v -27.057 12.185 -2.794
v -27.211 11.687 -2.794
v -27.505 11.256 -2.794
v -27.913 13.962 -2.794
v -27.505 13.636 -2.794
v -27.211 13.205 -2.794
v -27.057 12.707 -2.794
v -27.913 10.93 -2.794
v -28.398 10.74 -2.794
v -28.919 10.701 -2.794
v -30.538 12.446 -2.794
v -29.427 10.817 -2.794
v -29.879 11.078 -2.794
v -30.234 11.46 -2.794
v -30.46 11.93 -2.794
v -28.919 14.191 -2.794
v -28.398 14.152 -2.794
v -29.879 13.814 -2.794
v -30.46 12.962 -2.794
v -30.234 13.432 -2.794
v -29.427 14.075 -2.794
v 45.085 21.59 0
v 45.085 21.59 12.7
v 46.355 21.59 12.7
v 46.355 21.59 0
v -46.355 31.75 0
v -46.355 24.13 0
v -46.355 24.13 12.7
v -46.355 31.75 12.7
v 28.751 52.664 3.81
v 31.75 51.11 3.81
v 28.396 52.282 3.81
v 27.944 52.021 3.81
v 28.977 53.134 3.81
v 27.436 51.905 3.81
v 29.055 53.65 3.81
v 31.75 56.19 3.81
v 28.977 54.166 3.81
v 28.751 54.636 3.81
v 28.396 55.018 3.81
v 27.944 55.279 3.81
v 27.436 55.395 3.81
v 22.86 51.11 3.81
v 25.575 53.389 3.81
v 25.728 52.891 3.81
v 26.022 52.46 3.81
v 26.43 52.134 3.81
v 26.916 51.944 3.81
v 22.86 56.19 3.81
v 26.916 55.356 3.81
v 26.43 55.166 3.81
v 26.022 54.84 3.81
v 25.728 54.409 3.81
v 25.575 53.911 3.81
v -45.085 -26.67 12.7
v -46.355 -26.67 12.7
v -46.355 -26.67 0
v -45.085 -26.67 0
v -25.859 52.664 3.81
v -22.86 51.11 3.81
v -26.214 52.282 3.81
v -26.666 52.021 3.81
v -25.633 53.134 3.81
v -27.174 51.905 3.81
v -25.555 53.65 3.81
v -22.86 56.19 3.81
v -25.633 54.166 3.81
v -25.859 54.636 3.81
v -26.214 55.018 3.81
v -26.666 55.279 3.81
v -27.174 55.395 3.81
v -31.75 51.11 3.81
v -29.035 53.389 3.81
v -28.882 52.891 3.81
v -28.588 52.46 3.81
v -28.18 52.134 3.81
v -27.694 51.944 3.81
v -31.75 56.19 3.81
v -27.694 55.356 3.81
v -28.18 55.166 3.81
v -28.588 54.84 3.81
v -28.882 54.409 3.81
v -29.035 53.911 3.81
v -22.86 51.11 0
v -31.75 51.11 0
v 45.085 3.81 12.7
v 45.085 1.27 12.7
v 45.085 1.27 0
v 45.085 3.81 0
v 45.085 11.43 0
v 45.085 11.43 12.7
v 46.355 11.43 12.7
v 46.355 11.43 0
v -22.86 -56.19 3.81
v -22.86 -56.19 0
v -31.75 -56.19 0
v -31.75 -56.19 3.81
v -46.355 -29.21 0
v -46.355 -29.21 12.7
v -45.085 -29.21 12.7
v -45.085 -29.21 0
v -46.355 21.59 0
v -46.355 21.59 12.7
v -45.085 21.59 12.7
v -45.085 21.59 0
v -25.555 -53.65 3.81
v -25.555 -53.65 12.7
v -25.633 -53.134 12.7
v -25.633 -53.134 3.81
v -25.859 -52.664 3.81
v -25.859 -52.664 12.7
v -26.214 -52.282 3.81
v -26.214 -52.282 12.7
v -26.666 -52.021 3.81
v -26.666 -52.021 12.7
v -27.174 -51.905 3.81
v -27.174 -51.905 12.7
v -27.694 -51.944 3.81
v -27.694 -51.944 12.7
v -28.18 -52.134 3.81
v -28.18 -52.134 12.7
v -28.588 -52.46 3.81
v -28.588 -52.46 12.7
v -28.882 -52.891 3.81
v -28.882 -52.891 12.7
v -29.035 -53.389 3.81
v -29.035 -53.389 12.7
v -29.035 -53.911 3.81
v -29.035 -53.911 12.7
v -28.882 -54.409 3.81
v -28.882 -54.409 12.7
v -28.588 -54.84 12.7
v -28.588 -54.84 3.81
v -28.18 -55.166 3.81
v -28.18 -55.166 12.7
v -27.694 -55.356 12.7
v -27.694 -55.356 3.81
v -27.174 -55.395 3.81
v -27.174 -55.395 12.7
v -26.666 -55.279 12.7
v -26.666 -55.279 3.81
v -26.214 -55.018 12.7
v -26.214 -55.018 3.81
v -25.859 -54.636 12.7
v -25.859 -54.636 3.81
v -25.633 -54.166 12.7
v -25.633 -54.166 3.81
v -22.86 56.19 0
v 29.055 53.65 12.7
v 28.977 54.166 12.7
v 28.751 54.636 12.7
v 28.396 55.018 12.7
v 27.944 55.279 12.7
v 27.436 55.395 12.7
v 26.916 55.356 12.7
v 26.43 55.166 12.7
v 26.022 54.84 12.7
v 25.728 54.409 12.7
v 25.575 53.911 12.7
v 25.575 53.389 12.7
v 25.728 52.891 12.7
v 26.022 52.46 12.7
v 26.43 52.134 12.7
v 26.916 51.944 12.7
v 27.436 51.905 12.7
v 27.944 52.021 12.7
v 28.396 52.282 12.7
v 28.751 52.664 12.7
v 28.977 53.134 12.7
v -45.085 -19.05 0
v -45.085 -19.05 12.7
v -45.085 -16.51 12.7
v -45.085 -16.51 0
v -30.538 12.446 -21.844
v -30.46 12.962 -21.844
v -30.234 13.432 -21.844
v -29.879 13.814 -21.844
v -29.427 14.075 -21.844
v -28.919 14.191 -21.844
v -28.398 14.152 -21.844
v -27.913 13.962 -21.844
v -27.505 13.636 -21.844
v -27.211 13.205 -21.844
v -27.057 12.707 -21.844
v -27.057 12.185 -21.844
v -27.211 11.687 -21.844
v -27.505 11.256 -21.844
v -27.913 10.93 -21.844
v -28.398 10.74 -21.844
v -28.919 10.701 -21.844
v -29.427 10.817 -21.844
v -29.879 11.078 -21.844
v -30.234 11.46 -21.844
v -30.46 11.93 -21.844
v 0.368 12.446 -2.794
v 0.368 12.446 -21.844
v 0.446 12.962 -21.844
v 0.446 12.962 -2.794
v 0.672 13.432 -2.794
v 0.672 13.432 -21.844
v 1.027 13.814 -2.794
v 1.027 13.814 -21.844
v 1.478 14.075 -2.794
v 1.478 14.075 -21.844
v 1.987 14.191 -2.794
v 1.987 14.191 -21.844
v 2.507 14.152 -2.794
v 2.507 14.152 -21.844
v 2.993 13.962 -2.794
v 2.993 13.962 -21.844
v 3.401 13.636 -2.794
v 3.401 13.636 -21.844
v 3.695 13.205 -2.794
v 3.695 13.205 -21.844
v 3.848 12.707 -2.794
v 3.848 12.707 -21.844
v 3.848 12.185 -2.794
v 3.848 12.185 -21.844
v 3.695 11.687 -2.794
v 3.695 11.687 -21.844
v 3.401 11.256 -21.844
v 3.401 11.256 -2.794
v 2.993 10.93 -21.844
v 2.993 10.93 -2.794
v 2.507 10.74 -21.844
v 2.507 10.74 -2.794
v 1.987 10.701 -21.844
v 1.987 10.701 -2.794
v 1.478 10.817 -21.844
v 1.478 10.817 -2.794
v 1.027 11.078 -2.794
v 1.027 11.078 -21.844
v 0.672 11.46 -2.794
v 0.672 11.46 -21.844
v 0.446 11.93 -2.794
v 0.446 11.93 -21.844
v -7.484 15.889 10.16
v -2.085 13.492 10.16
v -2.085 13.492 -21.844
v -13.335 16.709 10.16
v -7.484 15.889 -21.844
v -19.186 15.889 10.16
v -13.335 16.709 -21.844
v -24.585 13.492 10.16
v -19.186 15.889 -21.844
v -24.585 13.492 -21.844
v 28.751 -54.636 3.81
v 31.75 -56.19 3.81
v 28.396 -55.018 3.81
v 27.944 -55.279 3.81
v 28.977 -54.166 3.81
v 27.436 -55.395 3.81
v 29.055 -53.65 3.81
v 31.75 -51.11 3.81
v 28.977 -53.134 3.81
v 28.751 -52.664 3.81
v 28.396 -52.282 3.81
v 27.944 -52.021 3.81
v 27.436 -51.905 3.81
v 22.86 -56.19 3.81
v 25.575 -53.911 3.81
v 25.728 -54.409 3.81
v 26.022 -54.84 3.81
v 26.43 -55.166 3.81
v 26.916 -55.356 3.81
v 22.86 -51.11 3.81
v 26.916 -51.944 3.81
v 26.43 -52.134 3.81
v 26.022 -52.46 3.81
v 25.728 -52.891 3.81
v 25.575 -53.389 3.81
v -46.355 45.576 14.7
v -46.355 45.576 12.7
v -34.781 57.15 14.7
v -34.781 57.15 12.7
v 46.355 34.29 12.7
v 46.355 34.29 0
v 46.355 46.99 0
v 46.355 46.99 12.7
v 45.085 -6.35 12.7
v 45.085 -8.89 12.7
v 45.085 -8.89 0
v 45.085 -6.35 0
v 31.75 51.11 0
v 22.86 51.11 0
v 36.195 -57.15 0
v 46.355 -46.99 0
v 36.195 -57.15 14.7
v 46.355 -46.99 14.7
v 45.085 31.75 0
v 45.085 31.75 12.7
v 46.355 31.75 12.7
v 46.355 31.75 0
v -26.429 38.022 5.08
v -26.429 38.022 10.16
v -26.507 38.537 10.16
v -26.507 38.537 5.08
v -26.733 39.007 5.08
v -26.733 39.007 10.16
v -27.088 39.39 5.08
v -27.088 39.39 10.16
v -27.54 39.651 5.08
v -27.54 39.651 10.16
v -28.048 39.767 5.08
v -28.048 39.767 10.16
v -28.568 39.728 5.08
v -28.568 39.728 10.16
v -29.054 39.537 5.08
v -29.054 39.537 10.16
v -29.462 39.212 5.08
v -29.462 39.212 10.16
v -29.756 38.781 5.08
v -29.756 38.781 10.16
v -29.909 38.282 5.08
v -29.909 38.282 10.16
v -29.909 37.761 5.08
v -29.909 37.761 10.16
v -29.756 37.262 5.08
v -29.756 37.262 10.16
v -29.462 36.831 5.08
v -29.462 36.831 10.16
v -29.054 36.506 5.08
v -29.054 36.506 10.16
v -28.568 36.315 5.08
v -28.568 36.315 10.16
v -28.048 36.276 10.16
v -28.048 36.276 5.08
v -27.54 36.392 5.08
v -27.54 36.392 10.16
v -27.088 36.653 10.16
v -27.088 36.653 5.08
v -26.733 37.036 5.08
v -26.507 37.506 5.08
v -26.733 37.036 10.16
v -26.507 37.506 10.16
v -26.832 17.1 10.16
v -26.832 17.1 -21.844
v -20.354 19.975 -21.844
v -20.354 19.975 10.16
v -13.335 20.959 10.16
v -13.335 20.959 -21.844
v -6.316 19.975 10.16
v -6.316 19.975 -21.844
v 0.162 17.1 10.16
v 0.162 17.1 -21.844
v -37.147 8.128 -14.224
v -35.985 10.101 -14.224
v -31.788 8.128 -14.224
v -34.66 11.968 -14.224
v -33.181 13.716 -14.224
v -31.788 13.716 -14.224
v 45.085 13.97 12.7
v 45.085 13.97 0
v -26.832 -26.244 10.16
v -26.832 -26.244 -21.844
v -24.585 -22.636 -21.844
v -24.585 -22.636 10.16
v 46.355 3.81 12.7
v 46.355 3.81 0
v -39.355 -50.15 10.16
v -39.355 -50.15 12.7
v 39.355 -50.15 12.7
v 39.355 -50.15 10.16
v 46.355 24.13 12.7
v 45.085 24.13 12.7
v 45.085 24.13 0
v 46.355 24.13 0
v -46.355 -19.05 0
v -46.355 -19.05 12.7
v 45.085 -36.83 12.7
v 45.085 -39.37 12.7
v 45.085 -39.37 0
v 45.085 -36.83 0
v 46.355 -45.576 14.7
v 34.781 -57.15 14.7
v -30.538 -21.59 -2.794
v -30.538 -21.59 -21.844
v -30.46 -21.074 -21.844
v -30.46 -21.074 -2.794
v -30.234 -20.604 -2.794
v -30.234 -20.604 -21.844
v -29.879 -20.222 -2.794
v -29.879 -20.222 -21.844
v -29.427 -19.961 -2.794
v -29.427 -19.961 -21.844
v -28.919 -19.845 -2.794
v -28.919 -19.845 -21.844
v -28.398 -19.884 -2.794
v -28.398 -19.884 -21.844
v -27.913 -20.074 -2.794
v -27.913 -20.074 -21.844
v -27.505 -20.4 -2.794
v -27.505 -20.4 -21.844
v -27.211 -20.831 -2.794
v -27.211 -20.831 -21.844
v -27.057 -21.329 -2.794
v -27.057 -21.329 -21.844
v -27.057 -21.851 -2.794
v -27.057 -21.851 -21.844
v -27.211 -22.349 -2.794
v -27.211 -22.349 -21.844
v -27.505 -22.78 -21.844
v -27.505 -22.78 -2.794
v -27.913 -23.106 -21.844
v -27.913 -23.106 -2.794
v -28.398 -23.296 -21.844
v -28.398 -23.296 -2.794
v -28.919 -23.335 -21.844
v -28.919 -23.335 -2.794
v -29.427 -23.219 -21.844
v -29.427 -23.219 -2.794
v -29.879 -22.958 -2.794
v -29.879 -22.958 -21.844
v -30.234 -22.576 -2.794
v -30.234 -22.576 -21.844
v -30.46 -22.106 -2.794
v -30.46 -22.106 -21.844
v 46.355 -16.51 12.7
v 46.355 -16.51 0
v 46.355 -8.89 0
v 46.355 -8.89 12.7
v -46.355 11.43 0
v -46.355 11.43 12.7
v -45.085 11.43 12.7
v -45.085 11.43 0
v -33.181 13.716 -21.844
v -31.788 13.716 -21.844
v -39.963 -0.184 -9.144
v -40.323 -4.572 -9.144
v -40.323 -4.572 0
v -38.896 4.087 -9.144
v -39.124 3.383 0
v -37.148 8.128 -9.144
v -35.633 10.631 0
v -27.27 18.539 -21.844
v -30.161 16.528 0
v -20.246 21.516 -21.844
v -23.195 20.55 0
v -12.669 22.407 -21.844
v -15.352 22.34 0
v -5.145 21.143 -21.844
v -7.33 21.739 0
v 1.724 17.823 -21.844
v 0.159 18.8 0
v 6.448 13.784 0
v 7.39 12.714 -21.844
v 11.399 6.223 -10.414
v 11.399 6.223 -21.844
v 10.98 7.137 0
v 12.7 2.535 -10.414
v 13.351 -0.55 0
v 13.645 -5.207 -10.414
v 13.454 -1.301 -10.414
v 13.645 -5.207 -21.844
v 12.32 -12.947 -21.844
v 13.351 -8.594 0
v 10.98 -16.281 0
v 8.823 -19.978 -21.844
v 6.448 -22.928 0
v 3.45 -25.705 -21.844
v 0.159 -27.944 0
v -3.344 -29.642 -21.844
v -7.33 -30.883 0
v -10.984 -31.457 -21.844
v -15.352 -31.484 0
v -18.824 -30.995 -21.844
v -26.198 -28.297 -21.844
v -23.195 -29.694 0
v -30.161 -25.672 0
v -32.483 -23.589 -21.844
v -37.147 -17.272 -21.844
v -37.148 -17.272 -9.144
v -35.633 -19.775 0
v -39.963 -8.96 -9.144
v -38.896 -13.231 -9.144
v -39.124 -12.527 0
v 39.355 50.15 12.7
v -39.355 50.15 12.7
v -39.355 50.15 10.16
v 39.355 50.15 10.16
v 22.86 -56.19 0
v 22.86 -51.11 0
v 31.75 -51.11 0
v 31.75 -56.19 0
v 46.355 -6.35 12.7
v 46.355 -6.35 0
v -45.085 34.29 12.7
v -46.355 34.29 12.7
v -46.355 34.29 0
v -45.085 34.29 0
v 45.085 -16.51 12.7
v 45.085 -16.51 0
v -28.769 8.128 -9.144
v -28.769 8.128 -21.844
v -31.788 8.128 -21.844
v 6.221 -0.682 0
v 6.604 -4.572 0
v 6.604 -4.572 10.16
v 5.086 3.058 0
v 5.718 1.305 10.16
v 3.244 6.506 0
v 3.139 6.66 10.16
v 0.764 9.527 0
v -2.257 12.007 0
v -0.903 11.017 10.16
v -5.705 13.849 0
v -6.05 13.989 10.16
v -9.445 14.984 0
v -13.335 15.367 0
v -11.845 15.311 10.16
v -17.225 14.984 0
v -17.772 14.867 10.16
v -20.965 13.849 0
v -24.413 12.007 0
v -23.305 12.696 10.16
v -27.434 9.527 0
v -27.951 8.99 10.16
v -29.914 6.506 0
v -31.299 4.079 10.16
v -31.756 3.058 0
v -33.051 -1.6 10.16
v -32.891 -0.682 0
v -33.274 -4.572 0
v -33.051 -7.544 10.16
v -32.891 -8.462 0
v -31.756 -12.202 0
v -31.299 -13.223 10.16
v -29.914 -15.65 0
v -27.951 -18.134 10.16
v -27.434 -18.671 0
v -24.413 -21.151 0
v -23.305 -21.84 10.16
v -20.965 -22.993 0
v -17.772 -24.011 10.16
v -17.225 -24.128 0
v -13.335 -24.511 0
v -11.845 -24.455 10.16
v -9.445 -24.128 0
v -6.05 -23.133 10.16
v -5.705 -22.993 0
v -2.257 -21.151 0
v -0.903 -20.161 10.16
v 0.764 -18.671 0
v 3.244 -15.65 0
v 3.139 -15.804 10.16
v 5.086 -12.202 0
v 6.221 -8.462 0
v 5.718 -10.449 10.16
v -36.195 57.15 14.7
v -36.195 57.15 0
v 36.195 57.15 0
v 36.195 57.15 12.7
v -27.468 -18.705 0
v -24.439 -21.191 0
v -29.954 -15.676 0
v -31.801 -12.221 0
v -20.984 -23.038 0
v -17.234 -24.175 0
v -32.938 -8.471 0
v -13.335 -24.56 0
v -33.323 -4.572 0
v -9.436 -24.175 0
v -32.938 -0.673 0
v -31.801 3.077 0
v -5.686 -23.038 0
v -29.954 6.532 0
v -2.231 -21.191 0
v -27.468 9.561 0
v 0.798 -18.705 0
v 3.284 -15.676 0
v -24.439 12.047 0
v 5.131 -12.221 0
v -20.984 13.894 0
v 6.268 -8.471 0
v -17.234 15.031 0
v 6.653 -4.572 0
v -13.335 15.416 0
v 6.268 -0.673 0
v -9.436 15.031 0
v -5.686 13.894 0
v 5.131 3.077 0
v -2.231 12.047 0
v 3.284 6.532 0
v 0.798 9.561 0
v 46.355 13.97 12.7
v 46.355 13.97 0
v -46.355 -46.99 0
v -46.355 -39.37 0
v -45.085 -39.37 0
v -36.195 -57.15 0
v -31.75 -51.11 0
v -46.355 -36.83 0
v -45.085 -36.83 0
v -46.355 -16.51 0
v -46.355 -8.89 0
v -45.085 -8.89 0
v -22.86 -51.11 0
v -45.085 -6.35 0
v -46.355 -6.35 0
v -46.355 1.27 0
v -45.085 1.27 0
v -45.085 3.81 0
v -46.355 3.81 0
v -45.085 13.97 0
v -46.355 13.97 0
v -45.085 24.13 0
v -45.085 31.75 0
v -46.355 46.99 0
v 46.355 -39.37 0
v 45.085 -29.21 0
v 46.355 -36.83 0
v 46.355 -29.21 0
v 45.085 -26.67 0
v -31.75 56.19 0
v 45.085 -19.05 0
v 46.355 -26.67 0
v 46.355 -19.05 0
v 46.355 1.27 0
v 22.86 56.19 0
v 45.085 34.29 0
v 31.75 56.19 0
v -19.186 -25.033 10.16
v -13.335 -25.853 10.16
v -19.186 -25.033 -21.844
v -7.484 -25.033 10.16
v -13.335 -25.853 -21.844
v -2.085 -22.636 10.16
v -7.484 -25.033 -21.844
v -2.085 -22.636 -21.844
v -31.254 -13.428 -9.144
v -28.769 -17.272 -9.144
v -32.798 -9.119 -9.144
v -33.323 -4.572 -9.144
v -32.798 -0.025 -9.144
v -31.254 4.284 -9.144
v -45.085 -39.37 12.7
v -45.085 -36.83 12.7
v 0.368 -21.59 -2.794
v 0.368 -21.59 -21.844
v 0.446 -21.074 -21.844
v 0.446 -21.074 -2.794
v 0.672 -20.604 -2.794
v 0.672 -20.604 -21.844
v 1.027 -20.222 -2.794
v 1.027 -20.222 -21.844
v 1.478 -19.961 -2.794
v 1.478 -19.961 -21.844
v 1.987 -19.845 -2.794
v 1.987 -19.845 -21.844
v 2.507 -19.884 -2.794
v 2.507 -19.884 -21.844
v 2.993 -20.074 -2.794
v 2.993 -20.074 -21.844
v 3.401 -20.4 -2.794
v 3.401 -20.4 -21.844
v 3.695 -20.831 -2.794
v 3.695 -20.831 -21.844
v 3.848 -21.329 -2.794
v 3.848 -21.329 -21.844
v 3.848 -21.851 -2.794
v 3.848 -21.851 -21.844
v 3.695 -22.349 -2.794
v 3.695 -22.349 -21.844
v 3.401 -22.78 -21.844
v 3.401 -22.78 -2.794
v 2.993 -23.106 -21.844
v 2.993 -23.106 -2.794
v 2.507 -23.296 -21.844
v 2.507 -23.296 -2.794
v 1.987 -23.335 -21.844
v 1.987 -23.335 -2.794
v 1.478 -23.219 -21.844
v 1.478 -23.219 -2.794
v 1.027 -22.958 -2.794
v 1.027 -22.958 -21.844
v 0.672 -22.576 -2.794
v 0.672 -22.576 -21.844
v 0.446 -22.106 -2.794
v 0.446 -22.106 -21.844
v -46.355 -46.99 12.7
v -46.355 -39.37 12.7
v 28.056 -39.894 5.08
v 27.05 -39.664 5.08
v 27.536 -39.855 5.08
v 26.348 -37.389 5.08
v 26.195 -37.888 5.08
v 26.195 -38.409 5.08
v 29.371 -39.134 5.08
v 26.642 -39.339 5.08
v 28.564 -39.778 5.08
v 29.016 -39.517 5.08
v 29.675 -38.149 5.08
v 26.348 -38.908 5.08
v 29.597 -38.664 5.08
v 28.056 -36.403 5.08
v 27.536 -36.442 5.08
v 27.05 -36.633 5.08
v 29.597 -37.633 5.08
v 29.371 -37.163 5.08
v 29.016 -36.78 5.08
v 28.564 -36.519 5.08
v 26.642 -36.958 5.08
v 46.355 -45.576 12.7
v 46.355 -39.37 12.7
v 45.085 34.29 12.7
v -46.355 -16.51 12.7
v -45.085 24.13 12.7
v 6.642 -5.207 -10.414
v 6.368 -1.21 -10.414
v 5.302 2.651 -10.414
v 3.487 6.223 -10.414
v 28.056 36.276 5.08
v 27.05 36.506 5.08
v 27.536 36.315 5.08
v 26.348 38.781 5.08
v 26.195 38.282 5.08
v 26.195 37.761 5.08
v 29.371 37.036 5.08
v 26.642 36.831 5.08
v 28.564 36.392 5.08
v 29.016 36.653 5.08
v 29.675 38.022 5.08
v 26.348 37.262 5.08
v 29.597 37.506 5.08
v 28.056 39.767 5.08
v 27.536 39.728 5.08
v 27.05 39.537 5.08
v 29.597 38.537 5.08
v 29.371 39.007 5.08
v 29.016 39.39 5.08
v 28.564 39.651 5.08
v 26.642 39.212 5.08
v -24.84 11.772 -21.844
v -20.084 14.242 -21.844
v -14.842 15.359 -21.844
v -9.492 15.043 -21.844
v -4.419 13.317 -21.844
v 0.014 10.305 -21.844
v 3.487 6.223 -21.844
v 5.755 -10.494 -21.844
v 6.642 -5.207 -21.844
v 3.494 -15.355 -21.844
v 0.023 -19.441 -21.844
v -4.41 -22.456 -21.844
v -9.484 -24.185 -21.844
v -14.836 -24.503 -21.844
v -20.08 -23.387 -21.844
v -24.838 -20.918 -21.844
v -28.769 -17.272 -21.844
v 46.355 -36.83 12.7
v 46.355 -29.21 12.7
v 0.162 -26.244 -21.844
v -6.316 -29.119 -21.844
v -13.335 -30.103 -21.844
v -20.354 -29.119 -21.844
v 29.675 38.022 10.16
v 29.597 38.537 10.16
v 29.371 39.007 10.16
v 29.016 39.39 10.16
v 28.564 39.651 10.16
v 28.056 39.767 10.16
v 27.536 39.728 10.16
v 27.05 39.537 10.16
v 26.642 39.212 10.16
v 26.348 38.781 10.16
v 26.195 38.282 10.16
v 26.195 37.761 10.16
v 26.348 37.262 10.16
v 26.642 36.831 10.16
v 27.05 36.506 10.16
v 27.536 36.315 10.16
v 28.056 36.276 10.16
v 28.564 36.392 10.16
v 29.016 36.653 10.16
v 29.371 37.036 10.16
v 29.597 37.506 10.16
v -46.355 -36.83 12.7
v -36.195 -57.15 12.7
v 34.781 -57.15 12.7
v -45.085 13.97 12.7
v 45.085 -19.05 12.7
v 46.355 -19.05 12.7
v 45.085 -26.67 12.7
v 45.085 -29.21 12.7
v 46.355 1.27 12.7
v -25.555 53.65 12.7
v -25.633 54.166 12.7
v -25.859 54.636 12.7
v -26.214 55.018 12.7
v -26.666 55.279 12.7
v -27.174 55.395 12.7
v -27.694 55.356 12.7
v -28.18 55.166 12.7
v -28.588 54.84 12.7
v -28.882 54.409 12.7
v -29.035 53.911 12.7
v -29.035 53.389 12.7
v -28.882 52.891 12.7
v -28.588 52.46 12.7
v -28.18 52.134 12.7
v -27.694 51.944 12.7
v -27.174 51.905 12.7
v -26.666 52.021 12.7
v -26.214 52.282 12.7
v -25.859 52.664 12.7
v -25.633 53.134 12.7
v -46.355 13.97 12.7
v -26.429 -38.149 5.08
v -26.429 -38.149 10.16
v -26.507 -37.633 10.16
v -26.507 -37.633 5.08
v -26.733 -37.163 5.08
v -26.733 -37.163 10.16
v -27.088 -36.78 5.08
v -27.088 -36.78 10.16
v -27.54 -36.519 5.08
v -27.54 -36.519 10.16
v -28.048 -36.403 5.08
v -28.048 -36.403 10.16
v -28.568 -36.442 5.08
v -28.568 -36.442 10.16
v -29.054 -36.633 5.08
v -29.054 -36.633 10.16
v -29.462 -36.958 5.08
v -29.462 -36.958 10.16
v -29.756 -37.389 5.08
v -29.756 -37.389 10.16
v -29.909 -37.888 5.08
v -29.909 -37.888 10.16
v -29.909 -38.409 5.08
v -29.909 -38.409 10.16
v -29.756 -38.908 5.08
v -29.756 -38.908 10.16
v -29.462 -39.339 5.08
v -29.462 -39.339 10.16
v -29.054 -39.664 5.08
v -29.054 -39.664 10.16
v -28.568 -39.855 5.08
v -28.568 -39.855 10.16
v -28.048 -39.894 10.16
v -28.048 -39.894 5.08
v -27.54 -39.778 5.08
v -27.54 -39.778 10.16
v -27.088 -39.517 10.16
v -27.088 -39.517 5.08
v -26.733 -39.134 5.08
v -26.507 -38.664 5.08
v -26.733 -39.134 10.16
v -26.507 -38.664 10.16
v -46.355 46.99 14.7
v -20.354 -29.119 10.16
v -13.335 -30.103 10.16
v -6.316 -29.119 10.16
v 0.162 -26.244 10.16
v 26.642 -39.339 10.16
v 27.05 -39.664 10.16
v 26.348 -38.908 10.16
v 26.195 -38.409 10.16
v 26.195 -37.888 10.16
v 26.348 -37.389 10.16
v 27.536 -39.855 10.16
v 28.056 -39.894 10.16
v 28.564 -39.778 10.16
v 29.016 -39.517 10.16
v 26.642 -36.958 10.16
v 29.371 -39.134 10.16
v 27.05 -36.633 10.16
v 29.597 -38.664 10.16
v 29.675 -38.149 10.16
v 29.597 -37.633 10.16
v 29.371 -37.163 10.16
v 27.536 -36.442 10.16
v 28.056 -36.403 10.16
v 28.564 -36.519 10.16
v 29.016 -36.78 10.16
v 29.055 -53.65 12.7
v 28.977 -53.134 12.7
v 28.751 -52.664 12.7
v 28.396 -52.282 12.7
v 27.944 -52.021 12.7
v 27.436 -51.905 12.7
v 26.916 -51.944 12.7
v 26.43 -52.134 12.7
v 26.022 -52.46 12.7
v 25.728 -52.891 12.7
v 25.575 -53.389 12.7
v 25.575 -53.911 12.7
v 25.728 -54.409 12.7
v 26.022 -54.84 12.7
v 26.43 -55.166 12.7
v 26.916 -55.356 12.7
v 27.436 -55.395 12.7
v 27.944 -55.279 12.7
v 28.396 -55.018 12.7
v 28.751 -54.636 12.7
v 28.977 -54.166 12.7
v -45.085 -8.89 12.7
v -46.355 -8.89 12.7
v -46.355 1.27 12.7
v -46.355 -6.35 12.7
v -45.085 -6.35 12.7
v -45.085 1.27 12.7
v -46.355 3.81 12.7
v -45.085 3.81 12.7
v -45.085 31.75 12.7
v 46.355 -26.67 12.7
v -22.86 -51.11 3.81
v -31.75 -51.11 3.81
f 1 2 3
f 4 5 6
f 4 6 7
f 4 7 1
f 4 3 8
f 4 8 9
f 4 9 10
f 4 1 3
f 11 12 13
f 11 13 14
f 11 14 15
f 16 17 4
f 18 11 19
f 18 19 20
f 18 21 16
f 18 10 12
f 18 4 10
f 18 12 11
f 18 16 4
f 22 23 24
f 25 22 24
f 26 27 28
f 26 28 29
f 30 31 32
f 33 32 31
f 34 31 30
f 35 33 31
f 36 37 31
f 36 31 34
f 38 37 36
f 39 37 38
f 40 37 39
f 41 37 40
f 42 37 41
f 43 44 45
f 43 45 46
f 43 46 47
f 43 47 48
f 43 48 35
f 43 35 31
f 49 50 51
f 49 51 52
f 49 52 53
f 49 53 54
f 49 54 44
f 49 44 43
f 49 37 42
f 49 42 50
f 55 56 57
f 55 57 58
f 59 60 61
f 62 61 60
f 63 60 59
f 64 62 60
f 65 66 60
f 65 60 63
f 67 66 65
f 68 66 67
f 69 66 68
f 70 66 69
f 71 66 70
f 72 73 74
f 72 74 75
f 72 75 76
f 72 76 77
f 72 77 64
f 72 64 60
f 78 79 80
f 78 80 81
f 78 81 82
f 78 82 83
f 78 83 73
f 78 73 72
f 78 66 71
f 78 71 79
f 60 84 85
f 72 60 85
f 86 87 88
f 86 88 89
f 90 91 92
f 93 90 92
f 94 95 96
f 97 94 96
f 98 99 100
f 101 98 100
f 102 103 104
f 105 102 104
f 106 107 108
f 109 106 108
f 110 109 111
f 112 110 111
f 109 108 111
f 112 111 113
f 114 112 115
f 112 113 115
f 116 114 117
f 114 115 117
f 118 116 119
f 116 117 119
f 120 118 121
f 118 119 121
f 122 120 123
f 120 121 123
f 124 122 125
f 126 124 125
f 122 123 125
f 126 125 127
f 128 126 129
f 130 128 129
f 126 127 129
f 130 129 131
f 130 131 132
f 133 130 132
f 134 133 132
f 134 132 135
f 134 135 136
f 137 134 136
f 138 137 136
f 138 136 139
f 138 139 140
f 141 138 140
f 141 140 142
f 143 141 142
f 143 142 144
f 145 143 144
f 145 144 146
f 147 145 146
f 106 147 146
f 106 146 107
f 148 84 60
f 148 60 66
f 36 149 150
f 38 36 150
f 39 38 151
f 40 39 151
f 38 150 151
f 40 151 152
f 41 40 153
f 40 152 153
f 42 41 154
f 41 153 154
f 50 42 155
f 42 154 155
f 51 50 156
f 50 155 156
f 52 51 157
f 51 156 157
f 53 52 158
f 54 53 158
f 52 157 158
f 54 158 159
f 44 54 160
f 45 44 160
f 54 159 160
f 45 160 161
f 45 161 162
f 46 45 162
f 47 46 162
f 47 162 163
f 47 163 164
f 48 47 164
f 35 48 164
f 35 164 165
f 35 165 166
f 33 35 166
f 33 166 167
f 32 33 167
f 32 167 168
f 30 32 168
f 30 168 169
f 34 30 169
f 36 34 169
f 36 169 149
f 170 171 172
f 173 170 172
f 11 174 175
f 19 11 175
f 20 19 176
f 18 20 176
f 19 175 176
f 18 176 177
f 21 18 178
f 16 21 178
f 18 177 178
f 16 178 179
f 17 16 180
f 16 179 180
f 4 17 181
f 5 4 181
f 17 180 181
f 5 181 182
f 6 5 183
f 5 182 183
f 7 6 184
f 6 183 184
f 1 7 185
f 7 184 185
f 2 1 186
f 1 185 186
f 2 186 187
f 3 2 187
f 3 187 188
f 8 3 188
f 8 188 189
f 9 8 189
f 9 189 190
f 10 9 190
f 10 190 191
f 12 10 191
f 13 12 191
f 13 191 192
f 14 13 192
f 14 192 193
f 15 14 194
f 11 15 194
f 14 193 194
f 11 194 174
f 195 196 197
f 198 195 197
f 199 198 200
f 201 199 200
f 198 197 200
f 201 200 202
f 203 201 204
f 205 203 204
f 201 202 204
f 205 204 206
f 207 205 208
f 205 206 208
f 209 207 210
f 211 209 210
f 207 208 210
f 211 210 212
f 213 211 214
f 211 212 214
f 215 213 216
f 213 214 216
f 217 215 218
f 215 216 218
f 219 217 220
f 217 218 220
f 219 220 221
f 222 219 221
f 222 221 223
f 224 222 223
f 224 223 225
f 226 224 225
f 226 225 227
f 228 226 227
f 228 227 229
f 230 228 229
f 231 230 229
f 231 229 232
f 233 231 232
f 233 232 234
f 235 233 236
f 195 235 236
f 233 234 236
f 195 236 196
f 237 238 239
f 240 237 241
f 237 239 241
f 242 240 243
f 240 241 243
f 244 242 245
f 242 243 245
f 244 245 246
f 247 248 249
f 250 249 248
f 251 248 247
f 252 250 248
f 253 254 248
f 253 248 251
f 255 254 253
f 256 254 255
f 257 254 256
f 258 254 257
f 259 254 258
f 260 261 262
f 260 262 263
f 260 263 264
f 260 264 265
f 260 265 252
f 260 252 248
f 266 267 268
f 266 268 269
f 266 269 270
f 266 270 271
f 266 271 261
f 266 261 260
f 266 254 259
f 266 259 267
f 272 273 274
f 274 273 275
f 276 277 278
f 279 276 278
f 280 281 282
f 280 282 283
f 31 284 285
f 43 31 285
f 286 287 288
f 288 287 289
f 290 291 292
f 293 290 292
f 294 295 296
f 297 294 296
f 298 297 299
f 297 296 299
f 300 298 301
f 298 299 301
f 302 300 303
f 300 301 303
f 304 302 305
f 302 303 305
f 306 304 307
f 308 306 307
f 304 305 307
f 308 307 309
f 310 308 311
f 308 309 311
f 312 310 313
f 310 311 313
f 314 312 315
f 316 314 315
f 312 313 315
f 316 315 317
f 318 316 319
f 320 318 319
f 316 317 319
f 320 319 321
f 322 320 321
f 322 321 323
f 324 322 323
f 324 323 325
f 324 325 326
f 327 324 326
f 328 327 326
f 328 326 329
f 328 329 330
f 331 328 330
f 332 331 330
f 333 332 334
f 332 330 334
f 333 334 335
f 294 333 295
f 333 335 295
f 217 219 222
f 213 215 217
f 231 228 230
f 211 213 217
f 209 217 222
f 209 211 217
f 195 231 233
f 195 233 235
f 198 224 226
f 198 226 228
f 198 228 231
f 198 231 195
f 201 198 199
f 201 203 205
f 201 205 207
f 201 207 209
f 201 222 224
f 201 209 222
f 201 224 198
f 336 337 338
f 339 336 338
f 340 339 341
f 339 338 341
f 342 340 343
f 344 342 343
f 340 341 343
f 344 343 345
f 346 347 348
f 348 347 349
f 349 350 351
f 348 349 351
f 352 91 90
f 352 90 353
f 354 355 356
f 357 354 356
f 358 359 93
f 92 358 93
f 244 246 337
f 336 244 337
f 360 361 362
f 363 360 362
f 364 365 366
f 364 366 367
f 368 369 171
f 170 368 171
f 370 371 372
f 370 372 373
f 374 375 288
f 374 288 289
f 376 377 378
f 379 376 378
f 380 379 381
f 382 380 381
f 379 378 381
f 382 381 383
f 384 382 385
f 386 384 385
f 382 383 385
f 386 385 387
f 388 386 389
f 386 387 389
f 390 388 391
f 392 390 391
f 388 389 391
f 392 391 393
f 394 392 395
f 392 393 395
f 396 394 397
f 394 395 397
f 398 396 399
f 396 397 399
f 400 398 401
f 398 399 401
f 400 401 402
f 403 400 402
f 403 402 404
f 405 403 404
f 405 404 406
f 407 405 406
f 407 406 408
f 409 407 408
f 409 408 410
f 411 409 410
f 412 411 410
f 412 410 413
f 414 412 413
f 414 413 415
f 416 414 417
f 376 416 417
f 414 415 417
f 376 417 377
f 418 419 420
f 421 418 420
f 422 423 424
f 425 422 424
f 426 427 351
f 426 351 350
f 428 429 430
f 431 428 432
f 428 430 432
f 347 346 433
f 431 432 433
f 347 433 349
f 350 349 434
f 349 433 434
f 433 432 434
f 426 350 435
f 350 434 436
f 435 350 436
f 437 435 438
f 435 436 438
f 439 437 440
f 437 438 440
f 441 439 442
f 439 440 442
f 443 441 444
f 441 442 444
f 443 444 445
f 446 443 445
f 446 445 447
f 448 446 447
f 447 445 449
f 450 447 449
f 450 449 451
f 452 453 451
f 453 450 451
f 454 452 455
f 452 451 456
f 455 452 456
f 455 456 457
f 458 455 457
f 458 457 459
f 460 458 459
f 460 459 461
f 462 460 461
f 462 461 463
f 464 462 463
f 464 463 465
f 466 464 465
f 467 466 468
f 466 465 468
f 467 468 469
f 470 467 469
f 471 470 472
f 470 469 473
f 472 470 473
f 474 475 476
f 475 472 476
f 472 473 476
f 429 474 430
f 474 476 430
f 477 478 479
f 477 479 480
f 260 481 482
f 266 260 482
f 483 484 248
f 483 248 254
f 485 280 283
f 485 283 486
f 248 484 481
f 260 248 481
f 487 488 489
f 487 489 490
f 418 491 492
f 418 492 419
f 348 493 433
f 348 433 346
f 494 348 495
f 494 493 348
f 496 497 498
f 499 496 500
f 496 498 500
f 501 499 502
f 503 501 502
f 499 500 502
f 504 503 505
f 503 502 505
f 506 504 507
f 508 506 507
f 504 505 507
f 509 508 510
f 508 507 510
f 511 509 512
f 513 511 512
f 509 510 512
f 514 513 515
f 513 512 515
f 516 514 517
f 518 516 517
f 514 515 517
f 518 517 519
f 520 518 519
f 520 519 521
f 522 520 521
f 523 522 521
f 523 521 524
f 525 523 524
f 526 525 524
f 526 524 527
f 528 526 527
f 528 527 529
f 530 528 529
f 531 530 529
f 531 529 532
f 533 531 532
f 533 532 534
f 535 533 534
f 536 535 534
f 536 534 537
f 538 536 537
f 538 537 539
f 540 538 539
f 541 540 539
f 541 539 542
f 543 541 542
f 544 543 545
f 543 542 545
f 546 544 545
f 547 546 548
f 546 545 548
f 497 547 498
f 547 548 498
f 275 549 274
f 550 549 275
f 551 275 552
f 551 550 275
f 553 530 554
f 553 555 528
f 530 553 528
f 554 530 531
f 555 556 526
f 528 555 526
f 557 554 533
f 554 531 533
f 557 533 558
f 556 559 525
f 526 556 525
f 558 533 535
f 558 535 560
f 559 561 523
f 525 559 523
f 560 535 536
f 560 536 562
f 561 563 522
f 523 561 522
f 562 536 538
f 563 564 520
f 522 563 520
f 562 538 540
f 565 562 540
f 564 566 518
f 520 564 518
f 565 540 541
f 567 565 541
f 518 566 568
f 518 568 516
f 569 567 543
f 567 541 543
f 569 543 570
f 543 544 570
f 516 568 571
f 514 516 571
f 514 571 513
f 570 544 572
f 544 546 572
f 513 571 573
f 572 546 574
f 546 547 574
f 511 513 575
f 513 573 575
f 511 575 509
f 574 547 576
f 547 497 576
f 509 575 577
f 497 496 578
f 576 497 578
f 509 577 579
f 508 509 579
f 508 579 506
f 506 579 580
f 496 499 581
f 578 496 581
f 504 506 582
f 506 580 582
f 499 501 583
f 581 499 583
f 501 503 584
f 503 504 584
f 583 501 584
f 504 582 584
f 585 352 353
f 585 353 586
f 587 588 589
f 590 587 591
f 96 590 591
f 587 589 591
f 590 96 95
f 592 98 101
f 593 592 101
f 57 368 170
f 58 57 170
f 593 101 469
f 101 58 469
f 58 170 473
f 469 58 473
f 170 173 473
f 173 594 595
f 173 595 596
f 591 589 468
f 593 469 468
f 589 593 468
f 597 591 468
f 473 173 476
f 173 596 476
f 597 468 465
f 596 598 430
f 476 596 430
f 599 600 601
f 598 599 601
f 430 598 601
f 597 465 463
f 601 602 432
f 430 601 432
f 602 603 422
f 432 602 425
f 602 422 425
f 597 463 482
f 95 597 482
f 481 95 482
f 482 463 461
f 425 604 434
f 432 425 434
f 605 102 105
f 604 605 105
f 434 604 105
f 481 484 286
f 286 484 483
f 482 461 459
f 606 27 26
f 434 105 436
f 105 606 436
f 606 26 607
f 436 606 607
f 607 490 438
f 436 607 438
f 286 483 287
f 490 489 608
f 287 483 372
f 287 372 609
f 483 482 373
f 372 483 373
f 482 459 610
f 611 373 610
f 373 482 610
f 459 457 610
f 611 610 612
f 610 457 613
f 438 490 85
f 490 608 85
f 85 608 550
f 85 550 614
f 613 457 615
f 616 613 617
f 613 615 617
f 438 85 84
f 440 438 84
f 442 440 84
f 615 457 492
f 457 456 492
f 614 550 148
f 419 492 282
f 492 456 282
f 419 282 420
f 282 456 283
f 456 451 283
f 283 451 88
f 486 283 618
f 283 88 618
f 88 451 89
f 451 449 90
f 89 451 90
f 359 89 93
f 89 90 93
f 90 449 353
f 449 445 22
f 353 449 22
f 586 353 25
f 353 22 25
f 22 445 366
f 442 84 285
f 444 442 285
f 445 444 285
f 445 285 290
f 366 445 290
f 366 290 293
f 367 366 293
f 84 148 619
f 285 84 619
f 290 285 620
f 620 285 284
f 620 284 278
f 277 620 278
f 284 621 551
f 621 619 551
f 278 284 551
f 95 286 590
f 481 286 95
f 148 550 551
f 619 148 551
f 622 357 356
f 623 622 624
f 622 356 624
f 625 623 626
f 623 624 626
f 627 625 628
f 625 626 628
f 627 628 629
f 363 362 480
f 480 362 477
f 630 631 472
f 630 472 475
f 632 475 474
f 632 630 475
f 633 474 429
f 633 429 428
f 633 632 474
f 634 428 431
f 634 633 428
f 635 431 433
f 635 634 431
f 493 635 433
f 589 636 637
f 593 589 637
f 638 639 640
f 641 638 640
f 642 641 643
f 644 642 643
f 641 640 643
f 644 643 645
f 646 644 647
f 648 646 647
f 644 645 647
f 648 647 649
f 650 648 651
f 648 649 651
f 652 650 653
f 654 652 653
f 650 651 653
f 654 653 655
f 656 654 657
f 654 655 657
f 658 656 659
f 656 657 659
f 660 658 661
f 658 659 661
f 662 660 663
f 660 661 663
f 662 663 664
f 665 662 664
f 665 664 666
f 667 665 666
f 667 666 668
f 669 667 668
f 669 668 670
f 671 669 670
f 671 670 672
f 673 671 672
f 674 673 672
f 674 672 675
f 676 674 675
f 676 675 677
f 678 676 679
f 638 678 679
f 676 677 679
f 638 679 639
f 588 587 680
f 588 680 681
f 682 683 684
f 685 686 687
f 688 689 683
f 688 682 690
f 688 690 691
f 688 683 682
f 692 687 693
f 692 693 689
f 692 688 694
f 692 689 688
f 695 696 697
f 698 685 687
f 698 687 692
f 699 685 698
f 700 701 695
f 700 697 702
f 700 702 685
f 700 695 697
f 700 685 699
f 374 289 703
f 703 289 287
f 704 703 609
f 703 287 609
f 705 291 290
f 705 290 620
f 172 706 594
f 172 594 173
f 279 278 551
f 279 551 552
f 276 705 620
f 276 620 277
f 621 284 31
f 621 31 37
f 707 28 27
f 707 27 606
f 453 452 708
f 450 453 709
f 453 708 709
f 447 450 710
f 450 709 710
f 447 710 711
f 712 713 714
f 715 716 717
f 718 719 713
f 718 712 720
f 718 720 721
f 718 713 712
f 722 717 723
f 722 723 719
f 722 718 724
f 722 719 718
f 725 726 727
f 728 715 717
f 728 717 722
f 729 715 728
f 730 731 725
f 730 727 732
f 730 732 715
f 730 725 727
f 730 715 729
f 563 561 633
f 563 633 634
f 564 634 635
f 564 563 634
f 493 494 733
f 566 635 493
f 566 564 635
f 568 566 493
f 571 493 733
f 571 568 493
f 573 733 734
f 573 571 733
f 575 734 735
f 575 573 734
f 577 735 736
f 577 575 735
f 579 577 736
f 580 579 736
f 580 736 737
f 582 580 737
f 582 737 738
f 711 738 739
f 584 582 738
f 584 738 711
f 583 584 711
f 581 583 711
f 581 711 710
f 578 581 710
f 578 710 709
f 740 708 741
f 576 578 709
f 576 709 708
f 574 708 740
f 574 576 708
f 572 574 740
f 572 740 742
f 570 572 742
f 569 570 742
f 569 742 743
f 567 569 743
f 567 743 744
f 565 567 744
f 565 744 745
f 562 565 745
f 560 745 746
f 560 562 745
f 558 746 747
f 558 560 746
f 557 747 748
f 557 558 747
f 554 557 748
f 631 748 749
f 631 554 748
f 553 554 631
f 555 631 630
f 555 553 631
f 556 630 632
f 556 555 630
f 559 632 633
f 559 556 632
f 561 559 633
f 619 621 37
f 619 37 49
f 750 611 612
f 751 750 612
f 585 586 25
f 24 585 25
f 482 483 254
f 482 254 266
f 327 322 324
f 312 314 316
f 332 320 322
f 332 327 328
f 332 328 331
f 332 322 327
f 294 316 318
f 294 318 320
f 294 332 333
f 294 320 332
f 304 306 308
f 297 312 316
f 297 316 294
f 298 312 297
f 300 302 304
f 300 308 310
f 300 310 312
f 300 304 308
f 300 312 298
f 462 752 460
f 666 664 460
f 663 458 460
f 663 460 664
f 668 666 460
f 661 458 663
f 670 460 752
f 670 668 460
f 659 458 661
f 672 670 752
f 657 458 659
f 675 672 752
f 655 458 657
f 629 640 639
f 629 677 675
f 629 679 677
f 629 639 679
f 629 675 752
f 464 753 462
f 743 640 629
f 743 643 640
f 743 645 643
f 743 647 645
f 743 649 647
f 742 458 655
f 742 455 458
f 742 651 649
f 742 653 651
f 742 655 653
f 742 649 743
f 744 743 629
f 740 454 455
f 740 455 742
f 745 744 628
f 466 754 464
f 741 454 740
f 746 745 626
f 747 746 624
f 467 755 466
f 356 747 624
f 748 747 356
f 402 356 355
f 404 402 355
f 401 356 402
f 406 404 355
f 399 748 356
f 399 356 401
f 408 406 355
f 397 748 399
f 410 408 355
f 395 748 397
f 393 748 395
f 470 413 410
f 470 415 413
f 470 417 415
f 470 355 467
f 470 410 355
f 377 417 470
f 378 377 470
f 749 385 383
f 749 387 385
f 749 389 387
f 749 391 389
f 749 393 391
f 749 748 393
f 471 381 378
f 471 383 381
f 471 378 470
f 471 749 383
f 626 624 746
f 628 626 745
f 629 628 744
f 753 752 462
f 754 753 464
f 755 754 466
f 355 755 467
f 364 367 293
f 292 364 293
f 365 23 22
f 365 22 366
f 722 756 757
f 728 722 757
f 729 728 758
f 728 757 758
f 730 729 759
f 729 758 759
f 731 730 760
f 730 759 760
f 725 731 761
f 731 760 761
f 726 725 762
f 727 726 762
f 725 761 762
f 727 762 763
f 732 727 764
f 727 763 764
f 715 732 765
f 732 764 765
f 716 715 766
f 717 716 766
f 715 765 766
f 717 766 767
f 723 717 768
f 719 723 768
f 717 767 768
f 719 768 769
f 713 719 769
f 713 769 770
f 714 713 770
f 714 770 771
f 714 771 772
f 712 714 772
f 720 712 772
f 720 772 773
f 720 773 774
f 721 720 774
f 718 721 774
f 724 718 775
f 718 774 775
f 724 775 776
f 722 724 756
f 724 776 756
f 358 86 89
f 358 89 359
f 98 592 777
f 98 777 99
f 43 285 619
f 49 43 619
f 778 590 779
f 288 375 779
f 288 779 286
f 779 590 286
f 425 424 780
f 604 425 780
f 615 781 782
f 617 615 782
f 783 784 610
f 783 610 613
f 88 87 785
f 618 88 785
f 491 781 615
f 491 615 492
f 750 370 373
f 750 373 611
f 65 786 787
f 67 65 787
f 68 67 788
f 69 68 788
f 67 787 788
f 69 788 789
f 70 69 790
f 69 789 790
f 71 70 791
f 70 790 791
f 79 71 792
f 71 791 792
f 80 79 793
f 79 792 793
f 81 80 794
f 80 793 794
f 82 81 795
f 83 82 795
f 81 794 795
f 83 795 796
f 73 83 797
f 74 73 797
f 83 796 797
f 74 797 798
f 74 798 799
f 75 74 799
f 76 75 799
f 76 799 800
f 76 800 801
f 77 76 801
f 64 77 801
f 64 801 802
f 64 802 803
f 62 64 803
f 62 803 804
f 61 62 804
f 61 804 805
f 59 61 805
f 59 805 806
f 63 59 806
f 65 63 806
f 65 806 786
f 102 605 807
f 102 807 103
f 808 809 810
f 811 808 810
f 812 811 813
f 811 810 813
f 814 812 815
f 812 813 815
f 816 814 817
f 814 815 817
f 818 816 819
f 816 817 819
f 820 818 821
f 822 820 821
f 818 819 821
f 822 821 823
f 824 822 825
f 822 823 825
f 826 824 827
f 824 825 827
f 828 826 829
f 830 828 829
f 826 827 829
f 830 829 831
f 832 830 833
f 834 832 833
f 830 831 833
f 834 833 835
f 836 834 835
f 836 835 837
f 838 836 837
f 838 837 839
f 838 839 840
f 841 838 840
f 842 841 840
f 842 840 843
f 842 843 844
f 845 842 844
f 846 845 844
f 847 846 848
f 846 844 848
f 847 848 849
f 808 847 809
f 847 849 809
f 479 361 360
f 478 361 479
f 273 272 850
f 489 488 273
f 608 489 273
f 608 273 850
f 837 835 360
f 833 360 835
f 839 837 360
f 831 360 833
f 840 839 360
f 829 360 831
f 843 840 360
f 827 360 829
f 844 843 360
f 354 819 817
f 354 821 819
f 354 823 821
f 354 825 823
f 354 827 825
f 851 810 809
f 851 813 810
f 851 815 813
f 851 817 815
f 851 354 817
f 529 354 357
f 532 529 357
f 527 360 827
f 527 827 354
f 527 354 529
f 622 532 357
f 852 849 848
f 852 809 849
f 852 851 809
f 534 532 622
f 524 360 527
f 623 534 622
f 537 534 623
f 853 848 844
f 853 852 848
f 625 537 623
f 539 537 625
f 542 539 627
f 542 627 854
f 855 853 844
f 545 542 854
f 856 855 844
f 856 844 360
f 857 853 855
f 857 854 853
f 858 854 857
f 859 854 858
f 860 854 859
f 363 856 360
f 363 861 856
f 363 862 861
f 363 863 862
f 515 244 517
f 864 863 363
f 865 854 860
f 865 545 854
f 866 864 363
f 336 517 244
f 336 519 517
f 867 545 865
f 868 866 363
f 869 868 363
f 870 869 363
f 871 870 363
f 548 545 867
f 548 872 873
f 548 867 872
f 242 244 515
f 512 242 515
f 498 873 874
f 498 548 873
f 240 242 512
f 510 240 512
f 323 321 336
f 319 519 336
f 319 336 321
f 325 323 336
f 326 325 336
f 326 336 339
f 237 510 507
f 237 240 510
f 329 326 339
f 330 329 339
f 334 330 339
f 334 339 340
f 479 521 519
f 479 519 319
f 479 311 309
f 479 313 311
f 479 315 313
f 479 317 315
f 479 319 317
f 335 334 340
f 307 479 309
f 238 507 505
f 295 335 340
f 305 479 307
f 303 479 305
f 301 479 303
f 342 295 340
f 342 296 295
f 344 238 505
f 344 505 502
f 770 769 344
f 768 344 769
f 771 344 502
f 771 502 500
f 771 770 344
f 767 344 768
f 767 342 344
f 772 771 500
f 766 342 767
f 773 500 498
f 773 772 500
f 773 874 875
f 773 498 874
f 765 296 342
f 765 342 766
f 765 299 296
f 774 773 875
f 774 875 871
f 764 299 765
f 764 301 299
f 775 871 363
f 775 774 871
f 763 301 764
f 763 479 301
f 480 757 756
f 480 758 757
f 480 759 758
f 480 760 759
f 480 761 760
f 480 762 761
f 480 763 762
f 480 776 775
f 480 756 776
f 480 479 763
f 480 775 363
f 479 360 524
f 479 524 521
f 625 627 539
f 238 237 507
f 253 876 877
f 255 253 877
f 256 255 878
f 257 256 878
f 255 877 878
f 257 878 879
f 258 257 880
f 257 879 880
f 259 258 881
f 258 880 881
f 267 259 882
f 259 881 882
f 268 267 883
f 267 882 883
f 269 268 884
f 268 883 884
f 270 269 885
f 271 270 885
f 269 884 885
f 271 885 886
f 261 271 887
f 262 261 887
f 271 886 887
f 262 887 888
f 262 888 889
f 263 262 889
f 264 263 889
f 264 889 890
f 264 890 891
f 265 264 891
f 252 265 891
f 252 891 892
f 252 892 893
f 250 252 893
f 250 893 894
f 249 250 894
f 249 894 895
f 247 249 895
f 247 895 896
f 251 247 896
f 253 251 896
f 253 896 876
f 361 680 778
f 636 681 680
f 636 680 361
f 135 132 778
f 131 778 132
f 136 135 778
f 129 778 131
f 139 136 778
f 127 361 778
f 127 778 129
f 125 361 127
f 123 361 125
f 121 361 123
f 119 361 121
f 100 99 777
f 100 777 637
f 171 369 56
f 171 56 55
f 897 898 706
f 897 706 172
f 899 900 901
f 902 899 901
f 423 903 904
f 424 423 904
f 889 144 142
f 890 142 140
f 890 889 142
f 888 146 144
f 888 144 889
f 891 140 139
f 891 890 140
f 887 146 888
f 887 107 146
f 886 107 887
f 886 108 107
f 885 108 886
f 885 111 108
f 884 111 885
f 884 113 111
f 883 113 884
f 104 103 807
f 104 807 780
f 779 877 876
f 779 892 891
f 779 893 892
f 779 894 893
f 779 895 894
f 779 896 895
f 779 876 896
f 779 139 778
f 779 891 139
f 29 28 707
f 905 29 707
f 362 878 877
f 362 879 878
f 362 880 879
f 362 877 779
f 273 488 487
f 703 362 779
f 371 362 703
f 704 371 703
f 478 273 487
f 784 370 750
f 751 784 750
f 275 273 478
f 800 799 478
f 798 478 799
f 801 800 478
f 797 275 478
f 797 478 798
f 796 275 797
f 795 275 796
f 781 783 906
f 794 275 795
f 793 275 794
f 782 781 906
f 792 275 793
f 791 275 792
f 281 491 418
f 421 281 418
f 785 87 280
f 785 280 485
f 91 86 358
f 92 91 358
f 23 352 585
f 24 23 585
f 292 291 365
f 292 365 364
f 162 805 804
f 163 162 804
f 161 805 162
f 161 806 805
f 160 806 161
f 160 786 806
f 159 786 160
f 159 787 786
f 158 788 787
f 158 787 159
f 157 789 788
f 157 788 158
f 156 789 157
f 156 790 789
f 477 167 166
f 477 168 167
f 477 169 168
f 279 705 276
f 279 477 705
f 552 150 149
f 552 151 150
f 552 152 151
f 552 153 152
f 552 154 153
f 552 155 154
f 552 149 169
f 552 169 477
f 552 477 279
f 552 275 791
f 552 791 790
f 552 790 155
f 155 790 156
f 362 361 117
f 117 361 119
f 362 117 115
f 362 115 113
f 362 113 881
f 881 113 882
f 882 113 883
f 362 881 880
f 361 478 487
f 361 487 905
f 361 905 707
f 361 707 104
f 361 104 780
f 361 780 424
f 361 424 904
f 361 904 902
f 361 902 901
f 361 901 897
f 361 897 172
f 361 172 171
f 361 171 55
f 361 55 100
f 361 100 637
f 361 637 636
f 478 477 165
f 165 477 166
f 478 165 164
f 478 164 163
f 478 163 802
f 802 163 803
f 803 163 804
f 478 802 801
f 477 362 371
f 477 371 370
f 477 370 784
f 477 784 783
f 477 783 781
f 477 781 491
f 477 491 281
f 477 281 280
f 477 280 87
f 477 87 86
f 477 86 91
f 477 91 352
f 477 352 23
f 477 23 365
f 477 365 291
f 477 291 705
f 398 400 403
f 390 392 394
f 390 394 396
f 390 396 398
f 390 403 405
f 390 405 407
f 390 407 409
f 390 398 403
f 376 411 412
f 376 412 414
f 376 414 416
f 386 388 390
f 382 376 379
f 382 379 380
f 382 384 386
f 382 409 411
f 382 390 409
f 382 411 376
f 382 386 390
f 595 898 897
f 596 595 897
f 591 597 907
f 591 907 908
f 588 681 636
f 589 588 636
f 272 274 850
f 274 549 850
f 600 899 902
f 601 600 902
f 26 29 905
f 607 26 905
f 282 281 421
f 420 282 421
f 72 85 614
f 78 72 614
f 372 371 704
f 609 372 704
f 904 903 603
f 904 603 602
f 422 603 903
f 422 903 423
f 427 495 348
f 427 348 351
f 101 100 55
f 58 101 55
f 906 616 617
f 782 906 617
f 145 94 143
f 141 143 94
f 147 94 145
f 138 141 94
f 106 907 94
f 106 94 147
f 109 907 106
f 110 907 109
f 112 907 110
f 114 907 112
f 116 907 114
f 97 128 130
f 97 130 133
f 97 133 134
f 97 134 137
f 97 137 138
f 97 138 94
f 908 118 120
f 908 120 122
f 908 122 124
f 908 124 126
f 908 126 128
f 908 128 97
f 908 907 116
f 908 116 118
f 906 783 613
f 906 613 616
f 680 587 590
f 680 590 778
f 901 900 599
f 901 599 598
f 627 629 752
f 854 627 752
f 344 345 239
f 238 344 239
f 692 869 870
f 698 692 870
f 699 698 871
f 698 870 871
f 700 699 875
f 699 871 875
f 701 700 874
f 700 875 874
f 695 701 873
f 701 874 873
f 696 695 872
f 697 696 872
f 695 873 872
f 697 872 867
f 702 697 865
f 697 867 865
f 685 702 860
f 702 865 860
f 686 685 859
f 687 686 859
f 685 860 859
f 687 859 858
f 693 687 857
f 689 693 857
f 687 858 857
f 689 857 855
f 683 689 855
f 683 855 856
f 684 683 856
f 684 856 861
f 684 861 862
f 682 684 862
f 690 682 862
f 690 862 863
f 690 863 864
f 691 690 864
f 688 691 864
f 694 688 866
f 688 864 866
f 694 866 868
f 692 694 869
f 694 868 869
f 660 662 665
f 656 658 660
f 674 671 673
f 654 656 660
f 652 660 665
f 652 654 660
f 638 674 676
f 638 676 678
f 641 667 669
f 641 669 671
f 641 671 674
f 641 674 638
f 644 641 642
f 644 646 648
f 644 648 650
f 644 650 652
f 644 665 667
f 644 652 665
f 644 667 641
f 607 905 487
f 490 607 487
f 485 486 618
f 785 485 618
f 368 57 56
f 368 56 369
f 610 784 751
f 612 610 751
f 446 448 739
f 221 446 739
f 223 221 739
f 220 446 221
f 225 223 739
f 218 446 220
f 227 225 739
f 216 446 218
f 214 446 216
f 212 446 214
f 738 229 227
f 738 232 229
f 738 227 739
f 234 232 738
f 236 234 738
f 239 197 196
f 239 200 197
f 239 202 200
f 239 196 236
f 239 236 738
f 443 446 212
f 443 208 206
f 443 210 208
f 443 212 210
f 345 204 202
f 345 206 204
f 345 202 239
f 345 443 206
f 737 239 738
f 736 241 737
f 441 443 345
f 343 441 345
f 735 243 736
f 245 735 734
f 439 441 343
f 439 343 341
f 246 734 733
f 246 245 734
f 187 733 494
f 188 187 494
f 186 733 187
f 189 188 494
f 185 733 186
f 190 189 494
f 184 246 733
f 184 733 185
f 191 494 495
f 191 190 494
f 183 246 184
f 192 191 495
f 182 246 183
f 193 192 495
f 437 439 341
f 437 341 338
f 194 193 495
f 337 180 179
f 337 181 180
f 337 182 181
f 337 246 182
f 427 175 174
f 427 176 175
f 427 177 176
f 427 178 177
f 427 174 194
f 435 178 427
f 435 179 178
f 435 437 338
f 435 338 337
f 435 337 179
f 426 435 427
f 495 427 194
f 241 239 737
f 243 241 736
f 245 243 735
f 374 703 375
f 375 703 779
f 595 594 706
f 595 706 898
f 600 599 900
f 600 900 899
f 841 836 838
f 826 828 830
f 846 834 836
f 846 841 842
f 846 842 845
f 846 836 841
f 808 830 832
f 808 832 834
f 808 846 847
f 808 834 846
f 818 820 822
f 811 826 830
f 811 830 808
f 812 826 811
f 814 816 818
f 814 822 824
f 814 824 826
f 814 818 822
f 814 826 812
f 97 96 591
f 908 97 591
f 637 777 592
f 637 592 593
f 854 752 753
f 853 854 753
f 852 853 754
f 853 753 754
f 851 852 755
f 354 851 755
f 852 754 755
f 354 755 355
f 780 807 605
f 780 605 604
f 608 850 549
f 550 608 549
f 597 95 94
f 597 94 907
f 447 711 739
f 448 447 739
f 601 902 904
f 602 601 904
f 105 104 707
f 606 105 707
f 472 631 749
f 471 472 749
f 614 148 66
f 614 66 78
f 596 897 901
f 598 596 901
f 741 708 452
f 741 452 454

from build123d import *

# Parameters (mm, degrees)
SKETCH1_W           = 92.71
SKETCH1_H           = 114.3
BOSS_EXTRUDE1_DEPTH = 12.7
SKETCH2_W           = 78.71000006
SKETCH2_H           = 100.30000006
CUT_EXTRUDE1_DEPTH  = 2.54
SKETCH3_R           = 19.939
CUT_EXTRUDE2_DEPTH  = 75.284144506
SKETCH4_R           = 26.9875
SKETCH4_R_2         = 19.98750003
BOSS_EXTRUDE2_DEPTH = 21.844
SKETCH6_R           = 1.750000056
CUT_EXTRUDE3_DEPTH  = 19.05
SKETCH12_W          = 12.7
SKETCH12_H          = 25.4
CUT_EXTRUDE6_DEPTH  = 77.759812799
SKETCH13_W          = 11.43
SKETCH13_H          = 11.43
CUT_EXTRUDE7_DEPTH  = 77.759812799
SKETCH14_R          = 1.750000056
CUT_EXTRUDE8_DEPTH  = 82.290814124
SKETCH16_W          = 8.89
SKETCH16_H          = 5.08
CUT_EXTRUDE9_DEPTH  = 3.81
SKETCH18_R          = 1.75
CUT_EXTRUDE11_DEPTH = 5.08
SKETCH19_W          = 2.54
SKETCH19_H          = 2.54
CUT_EXTRUDE12_DEPTH = 82.290814124
CHAMFER2_SIZE       = 10.16
CUT_EXTRUDE13_DEPTH = 82.290814124
BOSS_EXTRUDE3_DEPTH = 2
CUT_EXTRUDE14_START = -7.62
CUT_EXTRUDE14_DEPTH = 7.62


with BuildPart() as part:
    # Sketch1 → Boss-Extrude1 (new body)
    with BuildSketch(Plane.XY):
        Rectangle(SKETCH1_W, SKETCH1_H)
    extrude(amount=BOSS_EXTRUDE1_DEPTH)

    # Sketch2 → Cut-Extrude1 (cut)
    with BuildSketch(Plane.XY.offset(12.7)):
        Rectangle(SKETCH2_W, SKETCH2_H)
    extrude(amount=-CUT_EXTRUDE1_DEPTH, mode=Mode.SUBTRACT)

    # Sketch3 → Cut-Extrude2 (cut, through all)
    with BuildSketch(Plane.XY.offset(10.16)):
        with Locations((-13.335, -4.572)):
            Circle(SKETCH3_R)
    extrude(amount=-CUT_EXTRUDE2_DEPTH, mode=Mode.SUBTRACT)

    # Sketch4 → Boss-Extrude2 (add)
    with BuildSketch(Plane(origin=(0, 0, 0), x_dir=(-1, 0, 0), z_dir=(0, 0, -1))):
        with Locations((13.335, -4.572)):
            Circle(SKETCH4_R)
        with Locations((13.335, -4.572)):
            Circle(SKETCH4_R_2, mode=Mode.SUBTRACT)
    extrude(amount=BOSS_EXTRUDE2_DEPTH)

    # Sketch6 → Cut-Extrude3 (cut)
    with BuildSketch(Plane(origin=(0, 0, -21.844), x_dir=(-1, 0, 0), z_dir=(0, 0, -1))):
        with Locations((-2.11782644, 12.446)):
            Circle(SKETCH6_R)
        with Locations((28.78782644, -21.59)):
            Circle(SKETCH6_R)
        with Locations((28.78782644, 12.446)):
            Circle(SKETCH6_R)
        with Locations((-2.11782644, -21.59)):
            Circle(SKETCH6_R)
    extrude(amount=-CUT_EXTRUDE3_DEPTH, mode=Mode.SUBTRACT)

    # Sketch12 → Cut-Extrude6 (cut, through all)
    with BuildSketch(Plane(origin=(0, 0, 0), x_dir=(0, 0, -1), z_dir=(1, 0, 0))):
        with Locations((15.494, -4.572)):
            Rectangle(SKETCH12_W, SKETCH12_H)
    extrude(amount=-CUT_EXTRUDE6_DEPTH, mode=Mode.SUBTRACT)

    # Sketch13 → Cut-Extrude7 (cut, through all)
    with BuildSketch(Plane(origin=(0, 0, 0), x_dir=(0, 0, -1), z_dir=(1, 0, 0))):
        with Locations((16.129, 0.508)):
            Rectangle(SKETCH13_W, SKETCH13_H)
    extrude(amount=CUT_EXTRUDE7_DEPTH, mode=Mode.SUBTRACT)

    # Sketch14 → Cut-Extrude8 (cut, through all)
    with BuildSketch(Plane.XY.offset(12.7)):
        with Locations((-27.305, 53.65)):
            Circle(SKETCH14_R)
        with Locations((27.305, 53.65)):
            Circle(SKETCH14_R)
        with Locations((-27.305, -53.65)):
            Circle(SKETCH14_R)
        with Locations((27.305, -53.65)):
            Circle(SKETCH14_R)
    extrude(amount=-CUT_EXTRUDE8_DEPTH, mode=Mode.SUBTRACT)

    # Sketch16 → Cut-Extrude9 (cut)
    with BuildSketch(Plane(origin=(0, 0, 0), x_dir=(-1, 0, 0), z_dir=(0, 0, -1))):
        with Locations((-27.305, 53.65)):
            Rectangle(SKETCH16_W, SKETCH16_H)
        with Locations((27.305, 53.65)):
            Rectangle(SKETCH16_W, SKETCH16_H)
        with Locations((27.305, -53.65)):
            Rectangle(SKETCH16_W, SKETCH16_H)
        with Locations((-27.305, -53.65)):
            Rectangle(SKETCH16_W, SKETCH16_H)
    extrude(amount=-CUT_EXTRUDE9_DEPTH, mode=Mode.SUBTRACT)

    # Sketch18 → Cut-Extrude11 (cut)
    with BuildSketch(Plane.XY.offset(10.16)):
        with Locations((-28.17900003, 38.02150003)):
            Circle(SKETCH18_R)
        with Locations((27.92500003, 38.02150003)):
            Circle(SKETCH18_R)
        with Locations((-28.17900003, -38.14850003)):
            Circle(SKETCH18_R)
        with Locations((27.92500003, -38.14850003)):
            Circle(SKETCH18_R)
    extrude(amount=-CUT_EXTRUDE11_DEPTH, mode=Mode.SUBTRACT)

    # Sketch19 → Cut-Extrude12 (cut, through all)
    with BuildSketch(Plane.XY.offset(12.7)):
        with Locations((-46.355, -38.1)):
            Rectangle(SKETCH19_W, SKETCH19_H)
        with Locations((46.355, -38.1)):
            Rectangle(SKETCH19_W, SKETCH19_H)
        with Locations((-46.355, -27.94)):
            Rectangle(SKETCH19_W, SKETCH19_H)
        with Locations((46.355, -27.94)):
            Rectangle(SKETCH19_W, SKETCH19_H)
        with Locations((-46.355, -17.78)):
            Rectangle(SKETCH19_W, SKETCH19_H)
        with Locations((46.355, -17.78)):
            Rectangle(SKETCH19_W, SKETCH19_H)
        with Locations((-46.355, -7.62)):
            Rectangle(SKETCH19_W, SKETCH19_H)
        with Locations((46.355, -7.62)):
            Rectangle(SKETCH19_W, SKETCH19_H)
        with Locations((-46.355, 2.54)):
            Rectangle(SKETCH19_W, SKETCH19_H)
        with Locations((46.355, 2.54)):
            Rectangle(SKETCH19_W, SKETCH19_H)
        with Locations((-46.355, 12.7)):
            Rectangle(SKETCH19_W, SKETCH19_H)
        with Locations((46.355, 12.7)):
            Rectangle(SKETCH19_W, SKETCH19_H)
        with Locations((-46.355, 22.86)):
            Rectangle(SKETCH19_W, SKETCH19_H)
        with Locations((46.355, 22.86)):
            Rectangle(SKETCH19_W, SKETCH19_H)
        with Locations((-46.355, 33.02)):
            Rectangle(SKETCH19_W, SKETCH19_H)
        with Locations((46.355, 33.02)):
            Rectangle(SKETCH19_W, SKETCH19_H)
    extrude(amount=-CUT_EXTRUDE12_DEPTH, mode=Mode.SUBTRACT)

    # Chamfer2
    chamfer2_edges = [part.edges().sort_by_distance(p)[0] for p in [
        (46.355, -57.15, 6.35),
        (-46.355, -57.15, 6.35),
        (-46.355, 57.15, 6.35),
        (46.355, 57.15, 6.35),
    ]]
    chamfer(chamfer2_edges, length=CHAMFER2_SIZE)

    # Sketch20 → Cut-Extrude13 (cut, through all)
    with BuildSketch(Plane(origin=(0, 0, -21.844), x_dir=(-1, 0, 0), z_dir=(0, 0, -1))):
        with BuildLine():
            Line((-0.161794567, 17.099636308), (2.084843313, 13.492237618))
            ThreePointArc((2.084843313, 13.492237618), (13.335, 16.709041004), (24.585156687, 13.492237618))
            Line((24.585156687, 13.492237618), (26.831794567, 17.099636308))
            ThreePointArc((26.831794567, 17.099636308), (13.335, 20.958830066), (-0.161794567, 17.099636308))
        make_face()
        with BuildLine():
            Line((2.084843313, -22.636237618), (-0.161794567, -26.243636308))
            ThreePointArc((-0.161794567, -26.243636308), (13.335, -30.102830066), (26.831794567, -26.243636308))
            Line((26.831794567, -26.243636308), (24.585156687, -22.636237618))
            ThreePointArc((24.585156687, -22.636237618), (13.335, -25.853041004), (2.084843313, -22.636237618))
        make_face()
    extrude(amount=-CUT_EXTRUDE13_DEPTH, mode=Mode.SUBTRACT)

    # Sketch21 → Boss-Extrude3 (add)
    with BuildSketch(Plane.XY.offset(12.7)):
        Polygon((-40.567893219, 51.362893219), (-46.355, 45.575786438), (-46.355, 46.99), (-36.195, 57.15), (-34.780786438, 57.15), align=None)
        Polygon((40.567893219, -51.362893219), (34.780786438, -57.15), (36.195, -57.15), (46.355, -46.99), (46.355, -45.575786438), align=None)
    extrude(amount=BOSS_EXTRUDE3_DEPTH)

    # Sketch22 → Cut-Extrude14 (cut)
    with BuildSketch(Plane(origin=(0, 0, -21.844), x_dir=(-1, 0, 0), z_dir=(0, 0, -1)).offset(CUT_EXTRUDE14_START)):
        with BuildLine():
            Line((31.787826536, 8.128), (31.787826536, 13.716))
            Line((31.787826536, 13.716), (33.181264441, 13.716))
            ThreePointArc((33.181264441, 13.716), (35.342461556, 11.04839667), (37.1475, 8.128))
            Line((37.1475, 8.128), (31.787826536, 8.128))
        make_face()
    extrude(amount=CUT_EXTRUDE14_DEPTH, mode=Mode.SUBTRACT)


solid = part.part
